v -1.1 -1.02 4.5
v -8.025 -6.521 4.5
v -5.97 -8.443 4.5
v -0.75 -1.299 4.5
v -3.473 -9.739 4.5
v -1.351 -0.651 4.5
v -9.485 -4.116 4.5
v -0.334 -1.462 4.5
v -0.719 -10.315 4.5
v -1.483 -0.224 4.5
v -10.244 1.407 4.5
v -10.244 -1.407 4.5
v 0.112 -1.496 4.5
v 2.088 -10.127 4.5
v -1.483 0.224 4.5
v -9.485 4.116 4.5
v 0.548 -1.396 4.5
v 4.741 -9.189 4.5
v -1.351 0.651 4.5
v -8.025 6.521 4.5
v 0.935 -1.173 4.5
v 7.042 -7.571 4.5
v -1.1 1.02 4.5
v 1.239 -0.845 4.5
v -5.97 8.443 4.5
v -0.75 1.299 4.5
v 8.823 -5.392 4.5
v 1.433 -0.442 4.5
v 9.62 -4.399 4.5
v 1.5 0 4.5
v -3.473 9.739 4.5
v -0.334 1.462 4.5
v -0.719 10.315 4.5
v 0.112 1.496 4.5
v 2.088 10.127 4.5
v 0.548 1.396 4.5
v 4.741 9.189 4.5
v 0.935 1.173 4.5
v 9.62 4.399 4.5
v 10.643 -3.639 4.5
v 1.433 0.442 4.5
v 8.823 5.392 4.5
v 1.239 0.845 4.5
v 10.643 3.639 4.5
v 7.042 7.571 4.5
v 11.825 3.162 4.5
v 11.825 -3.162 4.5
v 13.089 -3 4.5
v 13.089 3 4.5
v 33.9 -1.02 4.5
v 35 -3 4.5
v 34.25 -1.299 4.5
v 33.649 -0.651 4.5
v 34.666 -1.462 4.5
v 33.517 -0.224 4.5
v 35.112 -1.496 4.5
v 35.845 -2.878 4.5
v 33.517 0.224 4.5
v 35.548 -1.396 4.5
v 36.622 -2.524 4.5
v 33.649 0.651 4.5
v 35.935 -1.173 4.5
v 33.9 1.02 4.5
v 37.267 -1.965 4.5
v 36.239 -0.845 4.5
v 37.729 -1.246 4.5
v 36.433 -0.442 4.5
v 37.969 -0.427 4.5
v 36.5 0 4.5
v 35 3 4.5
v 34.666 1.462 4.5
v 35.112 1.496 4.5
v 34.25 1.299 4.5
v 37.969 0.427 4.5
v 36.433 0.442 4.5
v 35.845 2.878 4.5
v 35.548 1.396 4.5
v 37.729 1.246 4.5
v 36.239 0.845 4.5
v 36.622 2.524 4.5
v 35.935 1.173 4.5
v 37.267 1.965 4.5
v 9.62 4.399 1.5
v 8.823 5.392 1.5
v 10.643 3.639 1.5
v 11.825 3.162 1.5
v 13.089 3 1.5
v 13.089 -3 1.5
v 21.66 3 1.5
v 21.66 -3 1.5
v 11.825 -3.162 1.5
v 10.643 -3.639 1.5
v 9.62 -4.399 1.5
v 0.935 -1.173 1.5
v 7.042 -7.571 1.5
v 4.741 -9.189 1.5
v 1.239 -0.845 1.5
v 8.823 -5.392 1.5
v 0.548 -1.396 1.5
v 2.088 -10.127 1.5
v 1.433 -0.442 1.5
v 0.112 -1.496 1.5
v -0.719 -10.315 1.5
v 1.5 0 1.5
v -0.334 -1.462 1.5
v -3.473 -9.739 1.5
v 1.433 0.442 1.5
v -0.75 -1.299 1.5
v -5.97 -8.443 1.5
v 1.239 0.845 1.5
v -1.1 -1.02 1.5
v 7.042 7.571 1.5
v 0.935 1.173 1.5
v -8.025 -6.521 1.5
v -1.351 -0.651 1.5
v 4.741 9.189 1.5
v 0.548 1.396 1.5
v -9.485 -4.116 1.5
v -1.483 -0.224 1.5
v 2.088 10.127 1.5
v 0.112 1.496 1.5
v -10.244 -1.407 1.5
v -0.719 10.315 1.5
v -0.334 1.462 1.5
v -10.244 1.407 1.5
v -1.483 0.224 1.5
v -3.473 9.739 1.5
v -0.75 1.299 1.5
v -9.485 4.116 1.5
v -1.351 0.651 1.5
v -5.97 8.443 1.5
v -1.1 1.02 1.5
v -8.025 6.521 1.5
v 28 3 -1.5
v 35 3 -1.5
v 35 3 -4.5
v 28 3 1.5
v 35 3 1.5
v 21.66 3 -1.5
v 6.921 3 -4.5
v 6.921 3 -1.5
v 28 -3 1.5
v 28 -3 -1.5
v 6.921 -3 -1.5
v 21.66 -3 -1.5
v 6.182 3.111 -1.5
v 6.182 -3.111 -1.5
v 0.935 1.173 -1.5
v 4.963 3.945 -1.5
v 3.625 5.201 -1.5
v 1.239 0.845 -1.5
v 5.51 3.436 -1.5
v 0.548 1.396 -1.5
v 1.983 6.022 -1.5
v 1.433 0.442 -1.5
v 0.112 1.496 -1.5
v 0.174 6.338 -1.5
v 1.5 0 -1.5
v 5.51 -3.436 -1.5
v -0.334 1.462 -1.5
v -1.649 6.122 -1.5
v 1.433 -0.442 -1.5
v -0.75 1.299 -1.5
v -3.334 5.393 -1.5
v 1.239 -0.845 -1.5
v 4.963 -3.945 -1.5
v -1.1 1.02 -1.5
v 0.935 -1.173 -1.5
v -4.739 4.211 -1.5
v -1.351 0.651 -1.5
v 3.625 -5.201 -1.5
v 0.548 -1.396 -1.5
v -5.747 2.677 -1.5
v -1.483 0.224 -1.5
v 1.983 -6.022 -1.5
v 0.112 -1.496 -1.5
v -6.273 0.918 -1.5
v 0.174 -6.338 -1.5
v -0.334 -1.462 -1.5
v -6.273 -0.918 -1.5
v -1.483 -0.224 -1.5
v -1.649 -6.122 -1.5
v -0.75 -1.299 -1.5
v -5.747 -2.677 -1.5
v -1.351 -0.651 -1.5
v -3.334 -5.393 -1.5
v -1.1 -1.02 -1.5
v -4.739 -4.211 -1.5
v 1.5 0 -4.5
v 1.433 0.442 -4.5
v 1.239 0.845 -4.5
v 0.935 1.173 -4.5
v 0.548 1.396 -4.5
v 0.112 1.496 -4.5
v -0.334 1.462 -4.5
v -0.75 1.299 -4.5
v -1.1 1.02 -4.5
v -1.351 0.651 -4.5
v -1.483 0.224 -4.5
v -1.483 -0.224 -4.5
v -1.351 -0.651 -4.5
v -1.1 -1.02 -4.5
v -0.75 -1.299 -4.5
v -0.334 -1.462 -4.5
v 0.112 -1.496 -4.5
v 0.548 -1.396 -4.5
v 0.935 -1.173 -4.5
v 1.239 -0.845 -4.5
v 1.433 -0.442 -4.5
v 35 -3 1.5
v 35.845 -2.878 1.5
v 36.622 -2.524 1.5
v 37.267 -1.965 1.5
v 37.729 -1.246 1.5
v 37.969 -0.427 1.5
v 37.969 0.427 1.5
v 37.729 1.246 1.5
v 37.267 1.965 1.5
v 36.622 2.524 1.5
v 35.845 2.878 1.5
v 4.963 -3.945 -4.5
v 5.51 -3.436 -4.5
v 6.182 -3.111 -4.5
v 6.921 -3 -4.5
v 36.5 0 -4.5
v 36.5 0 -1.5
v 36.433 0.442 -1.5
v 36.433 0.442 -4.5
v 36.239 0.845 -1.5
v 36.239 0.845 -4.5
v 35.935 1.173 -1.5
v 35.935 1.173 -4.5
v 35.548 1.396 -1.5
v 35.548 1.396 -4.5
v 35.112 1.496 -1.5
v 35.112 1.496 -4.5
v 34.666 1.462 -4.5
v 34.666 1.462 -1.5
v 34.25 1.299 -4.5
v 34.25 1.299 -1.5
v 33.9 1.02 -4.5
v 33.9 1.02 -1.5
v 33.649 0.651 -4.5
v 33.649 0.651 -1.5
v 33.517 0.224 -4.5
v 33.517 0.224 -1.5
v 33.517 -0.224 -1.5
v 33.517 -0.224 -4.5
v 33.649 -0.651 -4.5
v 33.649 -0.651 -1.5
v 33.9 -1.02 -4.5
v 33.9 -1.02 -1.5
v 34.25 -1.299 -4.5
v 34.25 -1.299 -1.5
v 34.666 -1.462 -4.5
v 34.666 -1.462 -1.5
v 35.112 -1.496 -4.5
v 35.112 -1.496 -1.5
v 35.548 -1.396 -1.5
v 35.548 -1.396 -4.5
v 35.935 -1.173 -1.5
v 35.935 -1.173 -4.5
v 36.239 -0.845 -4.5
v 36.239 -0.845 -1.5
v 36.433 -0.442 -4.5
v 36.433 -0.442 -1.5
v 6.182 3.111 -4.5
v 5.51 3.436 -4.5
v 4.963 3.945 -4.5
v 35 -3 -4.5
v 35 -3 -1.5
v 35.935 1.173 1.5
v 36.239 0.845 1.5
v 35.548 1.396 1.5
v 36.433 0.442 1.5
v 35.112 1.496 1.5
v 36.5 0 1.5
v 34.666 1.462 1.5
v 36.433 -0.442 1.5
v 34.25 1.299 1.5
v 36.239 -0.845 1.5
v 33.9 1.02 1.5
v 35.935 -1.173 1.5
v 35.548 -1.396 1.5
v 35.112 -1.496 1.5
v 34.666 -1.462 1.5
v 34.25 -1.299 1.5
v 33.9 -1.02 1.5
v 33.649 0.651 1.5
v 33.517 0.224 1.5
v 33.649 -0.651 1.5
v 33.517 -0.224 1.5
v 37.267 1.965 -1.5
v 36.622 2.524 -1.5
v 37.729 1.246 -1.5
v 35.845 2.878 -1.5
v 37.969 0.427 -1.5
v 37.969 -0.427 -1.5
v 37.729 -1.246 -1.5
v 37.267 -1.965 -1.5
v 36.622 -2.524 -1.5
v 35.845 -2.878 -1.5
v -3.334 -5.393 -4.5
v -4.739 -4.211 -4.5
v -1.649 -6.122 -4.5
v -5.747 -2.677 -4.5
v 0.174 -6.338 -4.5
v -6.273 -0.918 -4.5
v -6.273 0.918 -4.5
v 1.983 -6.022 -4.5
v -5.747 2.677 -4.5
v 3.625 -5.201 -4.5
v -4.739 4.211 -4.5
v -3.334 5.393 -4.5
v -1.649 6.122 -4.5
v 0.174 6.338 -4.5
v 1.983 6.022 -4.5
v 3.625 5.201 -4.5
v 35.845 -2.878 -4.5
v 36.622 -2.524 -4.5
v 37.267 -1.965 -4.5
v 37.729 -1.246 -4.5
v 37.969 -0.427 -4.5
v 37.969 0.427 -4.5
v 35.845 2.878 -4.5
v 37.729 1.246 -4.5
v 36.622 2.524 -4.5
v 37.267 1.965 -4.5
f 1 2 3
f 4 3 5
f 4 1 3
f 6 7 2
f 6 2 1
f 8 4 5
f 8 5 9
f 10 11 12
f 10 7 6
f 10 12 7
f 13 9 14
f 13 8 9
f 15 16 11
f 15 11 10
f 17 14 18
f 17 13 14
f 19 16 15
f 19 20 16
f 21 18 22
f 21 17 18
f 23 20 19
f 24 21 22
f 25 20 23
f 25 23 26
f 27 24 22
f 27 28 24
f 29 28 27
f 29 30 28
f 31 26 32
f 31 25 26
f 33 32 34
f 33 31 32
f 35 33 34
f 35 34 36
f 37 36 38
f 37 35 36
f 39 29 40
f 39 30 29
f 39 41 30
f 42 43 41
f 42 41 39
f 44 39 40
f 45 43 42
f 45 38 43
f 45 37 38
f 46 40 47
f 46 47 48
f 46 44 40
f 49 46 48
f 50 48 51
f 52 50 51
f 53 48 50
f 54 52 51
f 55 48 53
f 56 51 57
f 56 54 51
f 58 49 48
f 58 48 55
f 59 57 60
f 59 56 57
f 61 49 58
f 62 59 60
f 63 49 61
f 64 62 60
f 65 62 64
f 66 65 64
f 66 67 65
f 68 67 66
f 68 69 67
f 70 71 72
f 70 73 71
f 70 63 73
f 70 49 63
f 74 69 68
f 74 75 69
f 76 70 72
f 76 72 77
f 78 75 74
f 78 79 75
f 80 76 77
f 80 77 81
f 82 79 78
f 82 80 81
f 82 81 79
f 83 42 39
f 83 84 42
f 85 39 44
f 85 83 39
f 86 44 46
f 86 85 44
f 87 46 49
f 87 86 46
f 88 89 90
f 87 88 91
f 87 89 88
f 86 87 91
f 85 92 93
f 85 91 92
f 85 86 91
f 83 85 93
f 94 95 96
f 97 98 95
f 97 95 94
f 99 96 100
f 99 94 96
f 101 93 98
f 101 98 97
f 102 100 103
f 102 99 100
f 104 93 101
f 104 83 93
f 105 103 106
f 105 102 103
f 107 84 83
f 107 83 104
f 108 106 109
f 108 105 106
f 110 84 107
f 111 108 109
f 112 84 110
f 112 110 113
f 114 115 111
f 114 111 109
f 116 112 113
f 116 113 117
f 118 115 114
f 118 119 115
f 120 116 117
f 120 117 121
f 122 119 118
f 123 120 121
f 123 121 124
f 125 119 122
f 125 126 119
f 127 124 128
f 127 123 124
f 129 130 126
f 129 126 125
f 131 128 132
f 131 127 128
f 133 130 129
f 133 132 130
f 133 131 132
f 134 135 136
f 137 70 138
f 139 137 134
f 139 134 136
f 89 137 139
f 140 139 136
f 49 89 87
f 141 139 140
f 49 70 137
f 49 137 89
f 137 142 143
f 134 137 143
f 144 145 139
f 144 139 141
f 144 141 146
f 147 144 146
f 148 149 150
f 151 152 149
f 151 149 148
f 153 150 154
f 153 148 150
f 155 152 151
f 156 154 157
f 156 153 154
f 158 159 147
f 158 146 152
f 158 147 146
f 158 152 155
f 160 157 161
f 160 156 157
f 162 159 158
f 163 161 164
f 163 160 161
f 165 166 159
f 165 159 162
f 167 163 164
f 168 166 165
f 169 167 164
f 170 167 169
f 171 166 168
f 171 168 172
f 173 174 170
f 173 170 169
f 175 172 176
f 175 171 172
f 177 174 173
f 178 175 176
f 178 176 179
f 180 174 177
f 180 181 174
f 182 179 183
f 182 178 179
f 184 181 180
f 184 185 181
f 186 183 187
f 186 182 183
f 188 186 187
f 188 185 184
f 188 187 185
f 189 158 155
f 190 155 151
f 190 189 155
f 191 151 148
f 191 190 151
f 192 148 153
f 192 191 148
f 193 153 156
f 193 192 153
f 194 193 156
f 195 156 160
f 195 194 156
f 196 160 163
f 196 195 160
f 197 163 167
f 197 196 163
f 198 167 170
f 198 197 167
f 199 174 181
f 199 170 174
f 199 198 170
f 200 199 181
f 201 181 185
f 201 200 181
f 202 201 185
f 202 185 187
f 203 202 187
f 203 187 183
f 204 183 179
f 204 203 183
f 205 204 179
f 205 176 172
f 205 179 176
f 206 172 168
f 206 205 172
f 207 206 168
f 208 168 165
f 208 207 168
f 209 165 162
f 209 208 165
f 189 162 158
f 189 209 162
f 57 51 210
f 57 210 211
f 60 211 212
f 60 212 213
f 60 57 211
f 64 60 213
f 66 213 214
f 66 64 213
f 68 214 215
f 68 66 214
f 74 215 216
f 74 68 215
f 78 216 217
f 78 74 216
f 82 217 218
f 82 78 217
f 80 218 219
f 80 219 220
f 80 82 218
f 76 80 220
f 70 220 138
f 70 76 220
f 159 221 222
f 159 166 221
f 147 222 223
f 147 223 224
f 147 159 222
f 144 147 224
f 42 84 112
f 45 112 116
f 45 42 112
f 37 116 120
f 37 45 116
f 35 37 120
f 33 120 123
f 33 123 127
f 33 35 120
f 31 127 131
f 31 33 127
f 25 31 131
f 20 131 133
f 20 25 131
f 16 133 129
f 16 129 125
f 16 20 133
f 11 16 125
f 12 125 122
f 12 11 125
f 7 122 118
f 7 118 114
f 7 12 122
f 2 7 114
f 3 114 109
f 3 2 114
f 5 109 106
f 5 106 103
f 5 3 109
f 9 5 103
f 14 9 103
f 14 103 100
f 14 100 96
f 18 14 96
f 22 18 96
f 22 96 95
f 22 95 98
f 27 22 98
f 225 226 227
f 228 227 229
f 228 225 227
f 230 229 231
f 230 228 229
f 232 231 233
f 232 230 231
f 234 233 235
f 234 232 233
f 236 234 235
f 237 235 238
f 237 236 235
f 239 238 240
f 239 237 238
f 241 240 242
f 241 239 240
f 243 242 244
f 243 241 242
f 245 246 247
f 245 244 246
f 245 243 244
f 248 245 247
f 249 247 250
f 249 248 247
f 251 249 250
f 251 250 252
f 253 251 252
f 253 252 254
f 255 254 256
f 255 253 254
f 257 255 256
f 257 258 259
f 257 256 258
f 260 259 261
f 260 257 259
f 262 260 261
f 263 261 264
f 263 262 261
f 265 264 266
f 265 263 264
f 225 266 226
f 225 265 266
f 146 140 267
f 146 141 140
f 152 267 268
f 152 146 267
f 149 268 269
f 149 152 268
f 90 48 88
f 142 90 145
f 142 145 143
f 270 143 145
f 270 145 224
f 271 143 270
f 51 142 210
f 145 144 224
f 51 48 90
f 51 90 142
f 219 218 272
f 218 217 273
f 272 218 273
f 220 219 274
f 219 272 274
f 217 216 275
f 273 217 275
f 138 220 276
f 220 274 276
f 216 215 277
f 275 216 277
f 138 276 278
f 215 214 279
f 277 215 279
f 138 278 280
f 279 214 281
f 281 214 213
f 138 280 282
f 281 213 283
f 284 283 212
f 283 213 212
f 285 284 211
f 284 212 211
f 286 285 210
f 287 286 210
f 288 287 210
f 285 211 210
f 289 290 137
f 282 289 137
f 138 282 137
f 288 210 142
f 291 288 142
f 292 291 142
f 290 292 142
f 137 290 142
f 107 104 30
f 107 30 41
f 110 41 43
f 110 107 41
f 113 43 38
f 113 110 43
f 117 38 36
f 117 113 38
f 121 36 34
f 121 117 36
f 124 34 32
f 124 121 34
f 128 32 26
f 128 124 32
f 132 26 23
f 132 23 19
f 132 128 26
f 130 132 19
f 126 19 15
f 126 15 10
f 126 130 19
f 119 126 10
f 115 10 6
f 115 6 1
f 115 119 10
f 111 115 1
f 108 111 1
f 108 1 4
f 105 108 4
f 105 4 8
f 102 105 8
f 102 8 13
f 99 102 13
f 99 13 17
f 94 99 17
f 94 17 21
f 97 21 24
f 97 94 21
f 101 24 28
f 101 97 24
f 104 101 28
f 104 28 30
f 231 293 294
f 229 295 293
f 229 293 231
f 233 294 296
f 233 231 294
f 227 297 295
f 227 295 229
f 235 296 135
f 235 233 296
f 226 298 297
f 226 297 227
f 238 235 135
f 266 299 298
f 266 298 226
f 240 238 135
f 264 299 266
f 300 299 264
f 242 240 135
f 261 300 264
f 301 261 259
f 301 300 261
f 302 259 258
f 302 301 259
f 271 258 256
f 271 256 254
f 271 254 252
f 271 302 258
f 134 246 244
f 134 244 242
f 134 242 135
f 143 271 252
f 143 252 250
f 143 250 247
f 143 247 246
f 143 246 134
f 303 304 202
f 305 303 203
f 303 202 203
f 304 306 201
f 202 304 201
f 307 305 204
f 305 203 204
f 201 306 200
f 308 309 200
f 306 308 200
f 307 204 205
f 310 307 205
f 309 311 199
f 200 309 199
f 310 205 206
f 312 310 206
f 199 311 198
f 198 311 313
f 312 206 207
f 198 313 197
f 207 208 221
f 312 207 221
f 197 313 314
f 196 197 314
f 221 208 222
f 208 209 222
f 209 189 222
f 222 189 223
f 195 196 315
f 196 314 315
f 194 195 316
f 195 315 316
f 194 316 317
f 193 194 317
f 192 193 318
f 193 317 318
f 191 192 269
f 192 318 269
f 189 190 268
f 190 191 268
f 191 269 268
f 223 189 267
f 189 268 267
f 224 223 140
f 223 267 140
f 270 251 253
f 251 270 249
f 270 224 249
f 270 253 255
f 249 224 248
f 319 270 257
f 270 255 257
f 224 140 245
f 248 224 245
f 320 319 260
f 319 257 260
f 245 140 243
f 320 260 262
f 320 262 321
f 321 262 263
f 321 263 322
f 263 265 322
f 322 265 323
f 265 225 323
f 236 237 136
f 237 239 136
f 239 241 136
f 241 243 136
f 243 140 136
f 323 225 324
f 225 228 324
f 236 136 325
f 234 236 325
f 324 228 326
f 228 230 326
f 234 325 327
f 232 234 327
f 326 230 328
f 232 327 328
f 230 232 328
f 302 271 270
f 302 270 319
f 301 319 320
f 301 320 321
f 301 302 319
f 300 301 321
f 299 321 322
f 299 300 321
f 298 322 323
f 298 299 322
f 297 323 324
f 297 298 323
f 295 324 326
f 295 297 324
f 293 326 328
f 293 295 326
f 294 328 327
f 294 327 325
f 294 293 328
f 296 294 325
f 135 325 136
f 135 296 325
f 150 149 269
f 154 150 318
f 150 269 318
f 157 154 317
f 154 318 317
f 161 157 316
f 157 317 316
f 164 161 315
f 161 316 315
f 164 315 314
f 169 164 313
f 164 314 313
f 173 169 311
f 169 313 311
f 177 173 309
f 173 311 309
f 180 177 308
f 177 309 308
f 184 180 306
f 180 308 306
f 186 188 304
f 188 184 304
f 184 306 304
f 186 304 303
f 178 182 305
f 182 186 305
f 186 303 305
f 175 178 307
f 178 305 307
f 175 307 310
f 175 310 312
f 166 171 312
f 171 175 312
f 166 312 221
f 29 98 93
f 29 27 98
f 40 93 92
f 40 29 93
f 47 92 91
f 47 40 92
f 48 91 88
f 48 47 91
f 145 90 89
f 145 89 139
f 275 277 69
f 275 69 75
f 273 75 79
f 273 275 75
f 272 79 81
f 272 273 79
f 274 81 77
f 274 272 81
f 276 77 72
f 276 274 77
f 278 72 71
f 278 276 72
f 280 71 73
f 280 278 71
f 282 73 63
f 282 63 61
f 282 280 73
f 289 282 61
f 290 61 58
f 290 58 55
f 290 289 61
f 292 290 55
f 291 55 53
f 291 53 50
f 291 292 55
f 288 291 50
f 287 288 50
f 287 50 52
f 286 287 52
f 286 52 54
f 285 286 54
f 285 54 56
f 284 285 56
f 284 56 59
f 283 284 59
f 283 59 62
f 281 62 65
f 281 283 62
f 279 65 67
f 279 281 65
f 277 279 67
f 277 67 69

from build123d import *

# Parameters (mm, degrees)
ESTRUSIONE_ESTRUSIONE1_DEPTH      = 4.5
ESTRUSIONE_ESTRUSIONE1_DEPTH_BACK = 4.5
SCHIZZO1_R                        = 1.5
TAGLIO_ESTRUSIONE1_DEPTH          = 12.277661417
TAGLIO_ESTRUSIONE1_DEPTH_BACK     = 23.284267349
SCHIZZO2_W                        = 32
SCHIZZO2_H                        = 3
SCHIZZO2_W_2                      = 10
TAGLIO_ESTRUSIONE3_DEPTH          = 3.5
RACCORDO1_R                       = 5
RACCORDO2_R                       = 5
RACCORDO3_R                       = 2.5
RACCORDO4_R                       = 2.5


with BuildPart() as part:
    # Schizzo1 → Estrusione-Estrusione1 (new, two sides: drawn at the far end of the back side and taken through both)
    with BuildSketch(Plane.XY.offset(-ESTRUSIONE_ESTRUSIONE1_DEPTH_BACK)):
        with BuildLine():
            ThreePointArc((9.895231175, 3), (-10.34, 0), (9.895231175, -3))
            Line((9.895231175, -3), (35, -3))
            ThreePointArc((35, -3), (38, 0), (35, 3))
            Line((35, 3), (9.895231175, 3))
        make_face()
        Circle(SCHIZZO1_R, mode=Mode.SUBTRACT)
        with Locations((35, 0)):
            Circle(SCHIZZO1_R, mode=Mode.SUBTRACT)
    extrude(amount=ESTRUSIONE_ESTRUSIONE1_DEPTH + ESTRUSIONE_ESTRUSIONE1_DEPTH_BACK)

    # Schizzo2 → Taglio-Estrusione1 (cut, two sides: drawn at the far end of the back side and taken through both)
    with BuildSketch(Plane(origin=(0, -3, 0), x_dir=(-1, 0, 0), z_dir=(0, -1, 0)).offset(-TAGLIO_ESTRUSIONE1_DEPTH_BACK)):
        with Locations((-5.66, 0)):
            Rectangle(SCHIZZO2_W, SCHIZZO2_H)
        with Locations((-33, 0)):
            Rectangle(SCHIZZO2_W_2, SCHIZZO2_H)
    extrude(amount=TAGLIO_ESTRUSIONE1_DEPTH + TAGLIO_ESTRUSIONE1_DEPTH_BACK, mode=Mode.SUBTRACT)

    # Schizzo18 → Taglio-Estrusione3 (cut)
    with BuildSketch(Plane(origin=(0, 0, -4.5), x_dir=(-1, 0, 0), z_dir=(0, 0, -1))):
        with BuildLine():
            Line((-9.895231175, 3), (-5.58530214, 3))
            ThreePointArc((-5.58530214, 3), (6.34, 0), (-5.58530214, -3))
            Line((-5.58530214, -3), (-9.895231175, -3))
            ThreePointArc((-9.895231175, -3), (10.34, 0), (-9.895231175, 3))
        make_face()
    extrude(amount=-TAGLIO_ESTRUSIONE3_DEPTH, mode=Mode.SUBTRACT)

    # Raccordo1
    raccordo1_edges = [part.edges().sort_by_distance(p)[0] for p in [
        (9.895231175, 3, 3),
    ]]
    fillet(raccordo1_edges, radius=RACCORDO1_R)

    # Raccordo2
    raccordo2_edges = [part.edges().sort_by_distance(p)[0] for p in [
        (9.895231175, -3, 3),
    ]]
    fillet(raccordo2_edges, radius=RACCORDO2_R)

    # Raccordo3
    raccordo3_edges = [part.edges().sort_by_distance(p)[0] for p in [
        (5.58530214, 3, -3),
    ]]
    fillet(raccordo3_edges, radius=RACCORDO3_R)

    # Raccordo4
    raccordo4_edges = [part.edges().sort_by_distance(p)[0] for p in [
        (5.58530214, -3, -3),
    ]]
    fillet(raccordo4_edges, radius=RACCORDO4_R)


solid = part.part
